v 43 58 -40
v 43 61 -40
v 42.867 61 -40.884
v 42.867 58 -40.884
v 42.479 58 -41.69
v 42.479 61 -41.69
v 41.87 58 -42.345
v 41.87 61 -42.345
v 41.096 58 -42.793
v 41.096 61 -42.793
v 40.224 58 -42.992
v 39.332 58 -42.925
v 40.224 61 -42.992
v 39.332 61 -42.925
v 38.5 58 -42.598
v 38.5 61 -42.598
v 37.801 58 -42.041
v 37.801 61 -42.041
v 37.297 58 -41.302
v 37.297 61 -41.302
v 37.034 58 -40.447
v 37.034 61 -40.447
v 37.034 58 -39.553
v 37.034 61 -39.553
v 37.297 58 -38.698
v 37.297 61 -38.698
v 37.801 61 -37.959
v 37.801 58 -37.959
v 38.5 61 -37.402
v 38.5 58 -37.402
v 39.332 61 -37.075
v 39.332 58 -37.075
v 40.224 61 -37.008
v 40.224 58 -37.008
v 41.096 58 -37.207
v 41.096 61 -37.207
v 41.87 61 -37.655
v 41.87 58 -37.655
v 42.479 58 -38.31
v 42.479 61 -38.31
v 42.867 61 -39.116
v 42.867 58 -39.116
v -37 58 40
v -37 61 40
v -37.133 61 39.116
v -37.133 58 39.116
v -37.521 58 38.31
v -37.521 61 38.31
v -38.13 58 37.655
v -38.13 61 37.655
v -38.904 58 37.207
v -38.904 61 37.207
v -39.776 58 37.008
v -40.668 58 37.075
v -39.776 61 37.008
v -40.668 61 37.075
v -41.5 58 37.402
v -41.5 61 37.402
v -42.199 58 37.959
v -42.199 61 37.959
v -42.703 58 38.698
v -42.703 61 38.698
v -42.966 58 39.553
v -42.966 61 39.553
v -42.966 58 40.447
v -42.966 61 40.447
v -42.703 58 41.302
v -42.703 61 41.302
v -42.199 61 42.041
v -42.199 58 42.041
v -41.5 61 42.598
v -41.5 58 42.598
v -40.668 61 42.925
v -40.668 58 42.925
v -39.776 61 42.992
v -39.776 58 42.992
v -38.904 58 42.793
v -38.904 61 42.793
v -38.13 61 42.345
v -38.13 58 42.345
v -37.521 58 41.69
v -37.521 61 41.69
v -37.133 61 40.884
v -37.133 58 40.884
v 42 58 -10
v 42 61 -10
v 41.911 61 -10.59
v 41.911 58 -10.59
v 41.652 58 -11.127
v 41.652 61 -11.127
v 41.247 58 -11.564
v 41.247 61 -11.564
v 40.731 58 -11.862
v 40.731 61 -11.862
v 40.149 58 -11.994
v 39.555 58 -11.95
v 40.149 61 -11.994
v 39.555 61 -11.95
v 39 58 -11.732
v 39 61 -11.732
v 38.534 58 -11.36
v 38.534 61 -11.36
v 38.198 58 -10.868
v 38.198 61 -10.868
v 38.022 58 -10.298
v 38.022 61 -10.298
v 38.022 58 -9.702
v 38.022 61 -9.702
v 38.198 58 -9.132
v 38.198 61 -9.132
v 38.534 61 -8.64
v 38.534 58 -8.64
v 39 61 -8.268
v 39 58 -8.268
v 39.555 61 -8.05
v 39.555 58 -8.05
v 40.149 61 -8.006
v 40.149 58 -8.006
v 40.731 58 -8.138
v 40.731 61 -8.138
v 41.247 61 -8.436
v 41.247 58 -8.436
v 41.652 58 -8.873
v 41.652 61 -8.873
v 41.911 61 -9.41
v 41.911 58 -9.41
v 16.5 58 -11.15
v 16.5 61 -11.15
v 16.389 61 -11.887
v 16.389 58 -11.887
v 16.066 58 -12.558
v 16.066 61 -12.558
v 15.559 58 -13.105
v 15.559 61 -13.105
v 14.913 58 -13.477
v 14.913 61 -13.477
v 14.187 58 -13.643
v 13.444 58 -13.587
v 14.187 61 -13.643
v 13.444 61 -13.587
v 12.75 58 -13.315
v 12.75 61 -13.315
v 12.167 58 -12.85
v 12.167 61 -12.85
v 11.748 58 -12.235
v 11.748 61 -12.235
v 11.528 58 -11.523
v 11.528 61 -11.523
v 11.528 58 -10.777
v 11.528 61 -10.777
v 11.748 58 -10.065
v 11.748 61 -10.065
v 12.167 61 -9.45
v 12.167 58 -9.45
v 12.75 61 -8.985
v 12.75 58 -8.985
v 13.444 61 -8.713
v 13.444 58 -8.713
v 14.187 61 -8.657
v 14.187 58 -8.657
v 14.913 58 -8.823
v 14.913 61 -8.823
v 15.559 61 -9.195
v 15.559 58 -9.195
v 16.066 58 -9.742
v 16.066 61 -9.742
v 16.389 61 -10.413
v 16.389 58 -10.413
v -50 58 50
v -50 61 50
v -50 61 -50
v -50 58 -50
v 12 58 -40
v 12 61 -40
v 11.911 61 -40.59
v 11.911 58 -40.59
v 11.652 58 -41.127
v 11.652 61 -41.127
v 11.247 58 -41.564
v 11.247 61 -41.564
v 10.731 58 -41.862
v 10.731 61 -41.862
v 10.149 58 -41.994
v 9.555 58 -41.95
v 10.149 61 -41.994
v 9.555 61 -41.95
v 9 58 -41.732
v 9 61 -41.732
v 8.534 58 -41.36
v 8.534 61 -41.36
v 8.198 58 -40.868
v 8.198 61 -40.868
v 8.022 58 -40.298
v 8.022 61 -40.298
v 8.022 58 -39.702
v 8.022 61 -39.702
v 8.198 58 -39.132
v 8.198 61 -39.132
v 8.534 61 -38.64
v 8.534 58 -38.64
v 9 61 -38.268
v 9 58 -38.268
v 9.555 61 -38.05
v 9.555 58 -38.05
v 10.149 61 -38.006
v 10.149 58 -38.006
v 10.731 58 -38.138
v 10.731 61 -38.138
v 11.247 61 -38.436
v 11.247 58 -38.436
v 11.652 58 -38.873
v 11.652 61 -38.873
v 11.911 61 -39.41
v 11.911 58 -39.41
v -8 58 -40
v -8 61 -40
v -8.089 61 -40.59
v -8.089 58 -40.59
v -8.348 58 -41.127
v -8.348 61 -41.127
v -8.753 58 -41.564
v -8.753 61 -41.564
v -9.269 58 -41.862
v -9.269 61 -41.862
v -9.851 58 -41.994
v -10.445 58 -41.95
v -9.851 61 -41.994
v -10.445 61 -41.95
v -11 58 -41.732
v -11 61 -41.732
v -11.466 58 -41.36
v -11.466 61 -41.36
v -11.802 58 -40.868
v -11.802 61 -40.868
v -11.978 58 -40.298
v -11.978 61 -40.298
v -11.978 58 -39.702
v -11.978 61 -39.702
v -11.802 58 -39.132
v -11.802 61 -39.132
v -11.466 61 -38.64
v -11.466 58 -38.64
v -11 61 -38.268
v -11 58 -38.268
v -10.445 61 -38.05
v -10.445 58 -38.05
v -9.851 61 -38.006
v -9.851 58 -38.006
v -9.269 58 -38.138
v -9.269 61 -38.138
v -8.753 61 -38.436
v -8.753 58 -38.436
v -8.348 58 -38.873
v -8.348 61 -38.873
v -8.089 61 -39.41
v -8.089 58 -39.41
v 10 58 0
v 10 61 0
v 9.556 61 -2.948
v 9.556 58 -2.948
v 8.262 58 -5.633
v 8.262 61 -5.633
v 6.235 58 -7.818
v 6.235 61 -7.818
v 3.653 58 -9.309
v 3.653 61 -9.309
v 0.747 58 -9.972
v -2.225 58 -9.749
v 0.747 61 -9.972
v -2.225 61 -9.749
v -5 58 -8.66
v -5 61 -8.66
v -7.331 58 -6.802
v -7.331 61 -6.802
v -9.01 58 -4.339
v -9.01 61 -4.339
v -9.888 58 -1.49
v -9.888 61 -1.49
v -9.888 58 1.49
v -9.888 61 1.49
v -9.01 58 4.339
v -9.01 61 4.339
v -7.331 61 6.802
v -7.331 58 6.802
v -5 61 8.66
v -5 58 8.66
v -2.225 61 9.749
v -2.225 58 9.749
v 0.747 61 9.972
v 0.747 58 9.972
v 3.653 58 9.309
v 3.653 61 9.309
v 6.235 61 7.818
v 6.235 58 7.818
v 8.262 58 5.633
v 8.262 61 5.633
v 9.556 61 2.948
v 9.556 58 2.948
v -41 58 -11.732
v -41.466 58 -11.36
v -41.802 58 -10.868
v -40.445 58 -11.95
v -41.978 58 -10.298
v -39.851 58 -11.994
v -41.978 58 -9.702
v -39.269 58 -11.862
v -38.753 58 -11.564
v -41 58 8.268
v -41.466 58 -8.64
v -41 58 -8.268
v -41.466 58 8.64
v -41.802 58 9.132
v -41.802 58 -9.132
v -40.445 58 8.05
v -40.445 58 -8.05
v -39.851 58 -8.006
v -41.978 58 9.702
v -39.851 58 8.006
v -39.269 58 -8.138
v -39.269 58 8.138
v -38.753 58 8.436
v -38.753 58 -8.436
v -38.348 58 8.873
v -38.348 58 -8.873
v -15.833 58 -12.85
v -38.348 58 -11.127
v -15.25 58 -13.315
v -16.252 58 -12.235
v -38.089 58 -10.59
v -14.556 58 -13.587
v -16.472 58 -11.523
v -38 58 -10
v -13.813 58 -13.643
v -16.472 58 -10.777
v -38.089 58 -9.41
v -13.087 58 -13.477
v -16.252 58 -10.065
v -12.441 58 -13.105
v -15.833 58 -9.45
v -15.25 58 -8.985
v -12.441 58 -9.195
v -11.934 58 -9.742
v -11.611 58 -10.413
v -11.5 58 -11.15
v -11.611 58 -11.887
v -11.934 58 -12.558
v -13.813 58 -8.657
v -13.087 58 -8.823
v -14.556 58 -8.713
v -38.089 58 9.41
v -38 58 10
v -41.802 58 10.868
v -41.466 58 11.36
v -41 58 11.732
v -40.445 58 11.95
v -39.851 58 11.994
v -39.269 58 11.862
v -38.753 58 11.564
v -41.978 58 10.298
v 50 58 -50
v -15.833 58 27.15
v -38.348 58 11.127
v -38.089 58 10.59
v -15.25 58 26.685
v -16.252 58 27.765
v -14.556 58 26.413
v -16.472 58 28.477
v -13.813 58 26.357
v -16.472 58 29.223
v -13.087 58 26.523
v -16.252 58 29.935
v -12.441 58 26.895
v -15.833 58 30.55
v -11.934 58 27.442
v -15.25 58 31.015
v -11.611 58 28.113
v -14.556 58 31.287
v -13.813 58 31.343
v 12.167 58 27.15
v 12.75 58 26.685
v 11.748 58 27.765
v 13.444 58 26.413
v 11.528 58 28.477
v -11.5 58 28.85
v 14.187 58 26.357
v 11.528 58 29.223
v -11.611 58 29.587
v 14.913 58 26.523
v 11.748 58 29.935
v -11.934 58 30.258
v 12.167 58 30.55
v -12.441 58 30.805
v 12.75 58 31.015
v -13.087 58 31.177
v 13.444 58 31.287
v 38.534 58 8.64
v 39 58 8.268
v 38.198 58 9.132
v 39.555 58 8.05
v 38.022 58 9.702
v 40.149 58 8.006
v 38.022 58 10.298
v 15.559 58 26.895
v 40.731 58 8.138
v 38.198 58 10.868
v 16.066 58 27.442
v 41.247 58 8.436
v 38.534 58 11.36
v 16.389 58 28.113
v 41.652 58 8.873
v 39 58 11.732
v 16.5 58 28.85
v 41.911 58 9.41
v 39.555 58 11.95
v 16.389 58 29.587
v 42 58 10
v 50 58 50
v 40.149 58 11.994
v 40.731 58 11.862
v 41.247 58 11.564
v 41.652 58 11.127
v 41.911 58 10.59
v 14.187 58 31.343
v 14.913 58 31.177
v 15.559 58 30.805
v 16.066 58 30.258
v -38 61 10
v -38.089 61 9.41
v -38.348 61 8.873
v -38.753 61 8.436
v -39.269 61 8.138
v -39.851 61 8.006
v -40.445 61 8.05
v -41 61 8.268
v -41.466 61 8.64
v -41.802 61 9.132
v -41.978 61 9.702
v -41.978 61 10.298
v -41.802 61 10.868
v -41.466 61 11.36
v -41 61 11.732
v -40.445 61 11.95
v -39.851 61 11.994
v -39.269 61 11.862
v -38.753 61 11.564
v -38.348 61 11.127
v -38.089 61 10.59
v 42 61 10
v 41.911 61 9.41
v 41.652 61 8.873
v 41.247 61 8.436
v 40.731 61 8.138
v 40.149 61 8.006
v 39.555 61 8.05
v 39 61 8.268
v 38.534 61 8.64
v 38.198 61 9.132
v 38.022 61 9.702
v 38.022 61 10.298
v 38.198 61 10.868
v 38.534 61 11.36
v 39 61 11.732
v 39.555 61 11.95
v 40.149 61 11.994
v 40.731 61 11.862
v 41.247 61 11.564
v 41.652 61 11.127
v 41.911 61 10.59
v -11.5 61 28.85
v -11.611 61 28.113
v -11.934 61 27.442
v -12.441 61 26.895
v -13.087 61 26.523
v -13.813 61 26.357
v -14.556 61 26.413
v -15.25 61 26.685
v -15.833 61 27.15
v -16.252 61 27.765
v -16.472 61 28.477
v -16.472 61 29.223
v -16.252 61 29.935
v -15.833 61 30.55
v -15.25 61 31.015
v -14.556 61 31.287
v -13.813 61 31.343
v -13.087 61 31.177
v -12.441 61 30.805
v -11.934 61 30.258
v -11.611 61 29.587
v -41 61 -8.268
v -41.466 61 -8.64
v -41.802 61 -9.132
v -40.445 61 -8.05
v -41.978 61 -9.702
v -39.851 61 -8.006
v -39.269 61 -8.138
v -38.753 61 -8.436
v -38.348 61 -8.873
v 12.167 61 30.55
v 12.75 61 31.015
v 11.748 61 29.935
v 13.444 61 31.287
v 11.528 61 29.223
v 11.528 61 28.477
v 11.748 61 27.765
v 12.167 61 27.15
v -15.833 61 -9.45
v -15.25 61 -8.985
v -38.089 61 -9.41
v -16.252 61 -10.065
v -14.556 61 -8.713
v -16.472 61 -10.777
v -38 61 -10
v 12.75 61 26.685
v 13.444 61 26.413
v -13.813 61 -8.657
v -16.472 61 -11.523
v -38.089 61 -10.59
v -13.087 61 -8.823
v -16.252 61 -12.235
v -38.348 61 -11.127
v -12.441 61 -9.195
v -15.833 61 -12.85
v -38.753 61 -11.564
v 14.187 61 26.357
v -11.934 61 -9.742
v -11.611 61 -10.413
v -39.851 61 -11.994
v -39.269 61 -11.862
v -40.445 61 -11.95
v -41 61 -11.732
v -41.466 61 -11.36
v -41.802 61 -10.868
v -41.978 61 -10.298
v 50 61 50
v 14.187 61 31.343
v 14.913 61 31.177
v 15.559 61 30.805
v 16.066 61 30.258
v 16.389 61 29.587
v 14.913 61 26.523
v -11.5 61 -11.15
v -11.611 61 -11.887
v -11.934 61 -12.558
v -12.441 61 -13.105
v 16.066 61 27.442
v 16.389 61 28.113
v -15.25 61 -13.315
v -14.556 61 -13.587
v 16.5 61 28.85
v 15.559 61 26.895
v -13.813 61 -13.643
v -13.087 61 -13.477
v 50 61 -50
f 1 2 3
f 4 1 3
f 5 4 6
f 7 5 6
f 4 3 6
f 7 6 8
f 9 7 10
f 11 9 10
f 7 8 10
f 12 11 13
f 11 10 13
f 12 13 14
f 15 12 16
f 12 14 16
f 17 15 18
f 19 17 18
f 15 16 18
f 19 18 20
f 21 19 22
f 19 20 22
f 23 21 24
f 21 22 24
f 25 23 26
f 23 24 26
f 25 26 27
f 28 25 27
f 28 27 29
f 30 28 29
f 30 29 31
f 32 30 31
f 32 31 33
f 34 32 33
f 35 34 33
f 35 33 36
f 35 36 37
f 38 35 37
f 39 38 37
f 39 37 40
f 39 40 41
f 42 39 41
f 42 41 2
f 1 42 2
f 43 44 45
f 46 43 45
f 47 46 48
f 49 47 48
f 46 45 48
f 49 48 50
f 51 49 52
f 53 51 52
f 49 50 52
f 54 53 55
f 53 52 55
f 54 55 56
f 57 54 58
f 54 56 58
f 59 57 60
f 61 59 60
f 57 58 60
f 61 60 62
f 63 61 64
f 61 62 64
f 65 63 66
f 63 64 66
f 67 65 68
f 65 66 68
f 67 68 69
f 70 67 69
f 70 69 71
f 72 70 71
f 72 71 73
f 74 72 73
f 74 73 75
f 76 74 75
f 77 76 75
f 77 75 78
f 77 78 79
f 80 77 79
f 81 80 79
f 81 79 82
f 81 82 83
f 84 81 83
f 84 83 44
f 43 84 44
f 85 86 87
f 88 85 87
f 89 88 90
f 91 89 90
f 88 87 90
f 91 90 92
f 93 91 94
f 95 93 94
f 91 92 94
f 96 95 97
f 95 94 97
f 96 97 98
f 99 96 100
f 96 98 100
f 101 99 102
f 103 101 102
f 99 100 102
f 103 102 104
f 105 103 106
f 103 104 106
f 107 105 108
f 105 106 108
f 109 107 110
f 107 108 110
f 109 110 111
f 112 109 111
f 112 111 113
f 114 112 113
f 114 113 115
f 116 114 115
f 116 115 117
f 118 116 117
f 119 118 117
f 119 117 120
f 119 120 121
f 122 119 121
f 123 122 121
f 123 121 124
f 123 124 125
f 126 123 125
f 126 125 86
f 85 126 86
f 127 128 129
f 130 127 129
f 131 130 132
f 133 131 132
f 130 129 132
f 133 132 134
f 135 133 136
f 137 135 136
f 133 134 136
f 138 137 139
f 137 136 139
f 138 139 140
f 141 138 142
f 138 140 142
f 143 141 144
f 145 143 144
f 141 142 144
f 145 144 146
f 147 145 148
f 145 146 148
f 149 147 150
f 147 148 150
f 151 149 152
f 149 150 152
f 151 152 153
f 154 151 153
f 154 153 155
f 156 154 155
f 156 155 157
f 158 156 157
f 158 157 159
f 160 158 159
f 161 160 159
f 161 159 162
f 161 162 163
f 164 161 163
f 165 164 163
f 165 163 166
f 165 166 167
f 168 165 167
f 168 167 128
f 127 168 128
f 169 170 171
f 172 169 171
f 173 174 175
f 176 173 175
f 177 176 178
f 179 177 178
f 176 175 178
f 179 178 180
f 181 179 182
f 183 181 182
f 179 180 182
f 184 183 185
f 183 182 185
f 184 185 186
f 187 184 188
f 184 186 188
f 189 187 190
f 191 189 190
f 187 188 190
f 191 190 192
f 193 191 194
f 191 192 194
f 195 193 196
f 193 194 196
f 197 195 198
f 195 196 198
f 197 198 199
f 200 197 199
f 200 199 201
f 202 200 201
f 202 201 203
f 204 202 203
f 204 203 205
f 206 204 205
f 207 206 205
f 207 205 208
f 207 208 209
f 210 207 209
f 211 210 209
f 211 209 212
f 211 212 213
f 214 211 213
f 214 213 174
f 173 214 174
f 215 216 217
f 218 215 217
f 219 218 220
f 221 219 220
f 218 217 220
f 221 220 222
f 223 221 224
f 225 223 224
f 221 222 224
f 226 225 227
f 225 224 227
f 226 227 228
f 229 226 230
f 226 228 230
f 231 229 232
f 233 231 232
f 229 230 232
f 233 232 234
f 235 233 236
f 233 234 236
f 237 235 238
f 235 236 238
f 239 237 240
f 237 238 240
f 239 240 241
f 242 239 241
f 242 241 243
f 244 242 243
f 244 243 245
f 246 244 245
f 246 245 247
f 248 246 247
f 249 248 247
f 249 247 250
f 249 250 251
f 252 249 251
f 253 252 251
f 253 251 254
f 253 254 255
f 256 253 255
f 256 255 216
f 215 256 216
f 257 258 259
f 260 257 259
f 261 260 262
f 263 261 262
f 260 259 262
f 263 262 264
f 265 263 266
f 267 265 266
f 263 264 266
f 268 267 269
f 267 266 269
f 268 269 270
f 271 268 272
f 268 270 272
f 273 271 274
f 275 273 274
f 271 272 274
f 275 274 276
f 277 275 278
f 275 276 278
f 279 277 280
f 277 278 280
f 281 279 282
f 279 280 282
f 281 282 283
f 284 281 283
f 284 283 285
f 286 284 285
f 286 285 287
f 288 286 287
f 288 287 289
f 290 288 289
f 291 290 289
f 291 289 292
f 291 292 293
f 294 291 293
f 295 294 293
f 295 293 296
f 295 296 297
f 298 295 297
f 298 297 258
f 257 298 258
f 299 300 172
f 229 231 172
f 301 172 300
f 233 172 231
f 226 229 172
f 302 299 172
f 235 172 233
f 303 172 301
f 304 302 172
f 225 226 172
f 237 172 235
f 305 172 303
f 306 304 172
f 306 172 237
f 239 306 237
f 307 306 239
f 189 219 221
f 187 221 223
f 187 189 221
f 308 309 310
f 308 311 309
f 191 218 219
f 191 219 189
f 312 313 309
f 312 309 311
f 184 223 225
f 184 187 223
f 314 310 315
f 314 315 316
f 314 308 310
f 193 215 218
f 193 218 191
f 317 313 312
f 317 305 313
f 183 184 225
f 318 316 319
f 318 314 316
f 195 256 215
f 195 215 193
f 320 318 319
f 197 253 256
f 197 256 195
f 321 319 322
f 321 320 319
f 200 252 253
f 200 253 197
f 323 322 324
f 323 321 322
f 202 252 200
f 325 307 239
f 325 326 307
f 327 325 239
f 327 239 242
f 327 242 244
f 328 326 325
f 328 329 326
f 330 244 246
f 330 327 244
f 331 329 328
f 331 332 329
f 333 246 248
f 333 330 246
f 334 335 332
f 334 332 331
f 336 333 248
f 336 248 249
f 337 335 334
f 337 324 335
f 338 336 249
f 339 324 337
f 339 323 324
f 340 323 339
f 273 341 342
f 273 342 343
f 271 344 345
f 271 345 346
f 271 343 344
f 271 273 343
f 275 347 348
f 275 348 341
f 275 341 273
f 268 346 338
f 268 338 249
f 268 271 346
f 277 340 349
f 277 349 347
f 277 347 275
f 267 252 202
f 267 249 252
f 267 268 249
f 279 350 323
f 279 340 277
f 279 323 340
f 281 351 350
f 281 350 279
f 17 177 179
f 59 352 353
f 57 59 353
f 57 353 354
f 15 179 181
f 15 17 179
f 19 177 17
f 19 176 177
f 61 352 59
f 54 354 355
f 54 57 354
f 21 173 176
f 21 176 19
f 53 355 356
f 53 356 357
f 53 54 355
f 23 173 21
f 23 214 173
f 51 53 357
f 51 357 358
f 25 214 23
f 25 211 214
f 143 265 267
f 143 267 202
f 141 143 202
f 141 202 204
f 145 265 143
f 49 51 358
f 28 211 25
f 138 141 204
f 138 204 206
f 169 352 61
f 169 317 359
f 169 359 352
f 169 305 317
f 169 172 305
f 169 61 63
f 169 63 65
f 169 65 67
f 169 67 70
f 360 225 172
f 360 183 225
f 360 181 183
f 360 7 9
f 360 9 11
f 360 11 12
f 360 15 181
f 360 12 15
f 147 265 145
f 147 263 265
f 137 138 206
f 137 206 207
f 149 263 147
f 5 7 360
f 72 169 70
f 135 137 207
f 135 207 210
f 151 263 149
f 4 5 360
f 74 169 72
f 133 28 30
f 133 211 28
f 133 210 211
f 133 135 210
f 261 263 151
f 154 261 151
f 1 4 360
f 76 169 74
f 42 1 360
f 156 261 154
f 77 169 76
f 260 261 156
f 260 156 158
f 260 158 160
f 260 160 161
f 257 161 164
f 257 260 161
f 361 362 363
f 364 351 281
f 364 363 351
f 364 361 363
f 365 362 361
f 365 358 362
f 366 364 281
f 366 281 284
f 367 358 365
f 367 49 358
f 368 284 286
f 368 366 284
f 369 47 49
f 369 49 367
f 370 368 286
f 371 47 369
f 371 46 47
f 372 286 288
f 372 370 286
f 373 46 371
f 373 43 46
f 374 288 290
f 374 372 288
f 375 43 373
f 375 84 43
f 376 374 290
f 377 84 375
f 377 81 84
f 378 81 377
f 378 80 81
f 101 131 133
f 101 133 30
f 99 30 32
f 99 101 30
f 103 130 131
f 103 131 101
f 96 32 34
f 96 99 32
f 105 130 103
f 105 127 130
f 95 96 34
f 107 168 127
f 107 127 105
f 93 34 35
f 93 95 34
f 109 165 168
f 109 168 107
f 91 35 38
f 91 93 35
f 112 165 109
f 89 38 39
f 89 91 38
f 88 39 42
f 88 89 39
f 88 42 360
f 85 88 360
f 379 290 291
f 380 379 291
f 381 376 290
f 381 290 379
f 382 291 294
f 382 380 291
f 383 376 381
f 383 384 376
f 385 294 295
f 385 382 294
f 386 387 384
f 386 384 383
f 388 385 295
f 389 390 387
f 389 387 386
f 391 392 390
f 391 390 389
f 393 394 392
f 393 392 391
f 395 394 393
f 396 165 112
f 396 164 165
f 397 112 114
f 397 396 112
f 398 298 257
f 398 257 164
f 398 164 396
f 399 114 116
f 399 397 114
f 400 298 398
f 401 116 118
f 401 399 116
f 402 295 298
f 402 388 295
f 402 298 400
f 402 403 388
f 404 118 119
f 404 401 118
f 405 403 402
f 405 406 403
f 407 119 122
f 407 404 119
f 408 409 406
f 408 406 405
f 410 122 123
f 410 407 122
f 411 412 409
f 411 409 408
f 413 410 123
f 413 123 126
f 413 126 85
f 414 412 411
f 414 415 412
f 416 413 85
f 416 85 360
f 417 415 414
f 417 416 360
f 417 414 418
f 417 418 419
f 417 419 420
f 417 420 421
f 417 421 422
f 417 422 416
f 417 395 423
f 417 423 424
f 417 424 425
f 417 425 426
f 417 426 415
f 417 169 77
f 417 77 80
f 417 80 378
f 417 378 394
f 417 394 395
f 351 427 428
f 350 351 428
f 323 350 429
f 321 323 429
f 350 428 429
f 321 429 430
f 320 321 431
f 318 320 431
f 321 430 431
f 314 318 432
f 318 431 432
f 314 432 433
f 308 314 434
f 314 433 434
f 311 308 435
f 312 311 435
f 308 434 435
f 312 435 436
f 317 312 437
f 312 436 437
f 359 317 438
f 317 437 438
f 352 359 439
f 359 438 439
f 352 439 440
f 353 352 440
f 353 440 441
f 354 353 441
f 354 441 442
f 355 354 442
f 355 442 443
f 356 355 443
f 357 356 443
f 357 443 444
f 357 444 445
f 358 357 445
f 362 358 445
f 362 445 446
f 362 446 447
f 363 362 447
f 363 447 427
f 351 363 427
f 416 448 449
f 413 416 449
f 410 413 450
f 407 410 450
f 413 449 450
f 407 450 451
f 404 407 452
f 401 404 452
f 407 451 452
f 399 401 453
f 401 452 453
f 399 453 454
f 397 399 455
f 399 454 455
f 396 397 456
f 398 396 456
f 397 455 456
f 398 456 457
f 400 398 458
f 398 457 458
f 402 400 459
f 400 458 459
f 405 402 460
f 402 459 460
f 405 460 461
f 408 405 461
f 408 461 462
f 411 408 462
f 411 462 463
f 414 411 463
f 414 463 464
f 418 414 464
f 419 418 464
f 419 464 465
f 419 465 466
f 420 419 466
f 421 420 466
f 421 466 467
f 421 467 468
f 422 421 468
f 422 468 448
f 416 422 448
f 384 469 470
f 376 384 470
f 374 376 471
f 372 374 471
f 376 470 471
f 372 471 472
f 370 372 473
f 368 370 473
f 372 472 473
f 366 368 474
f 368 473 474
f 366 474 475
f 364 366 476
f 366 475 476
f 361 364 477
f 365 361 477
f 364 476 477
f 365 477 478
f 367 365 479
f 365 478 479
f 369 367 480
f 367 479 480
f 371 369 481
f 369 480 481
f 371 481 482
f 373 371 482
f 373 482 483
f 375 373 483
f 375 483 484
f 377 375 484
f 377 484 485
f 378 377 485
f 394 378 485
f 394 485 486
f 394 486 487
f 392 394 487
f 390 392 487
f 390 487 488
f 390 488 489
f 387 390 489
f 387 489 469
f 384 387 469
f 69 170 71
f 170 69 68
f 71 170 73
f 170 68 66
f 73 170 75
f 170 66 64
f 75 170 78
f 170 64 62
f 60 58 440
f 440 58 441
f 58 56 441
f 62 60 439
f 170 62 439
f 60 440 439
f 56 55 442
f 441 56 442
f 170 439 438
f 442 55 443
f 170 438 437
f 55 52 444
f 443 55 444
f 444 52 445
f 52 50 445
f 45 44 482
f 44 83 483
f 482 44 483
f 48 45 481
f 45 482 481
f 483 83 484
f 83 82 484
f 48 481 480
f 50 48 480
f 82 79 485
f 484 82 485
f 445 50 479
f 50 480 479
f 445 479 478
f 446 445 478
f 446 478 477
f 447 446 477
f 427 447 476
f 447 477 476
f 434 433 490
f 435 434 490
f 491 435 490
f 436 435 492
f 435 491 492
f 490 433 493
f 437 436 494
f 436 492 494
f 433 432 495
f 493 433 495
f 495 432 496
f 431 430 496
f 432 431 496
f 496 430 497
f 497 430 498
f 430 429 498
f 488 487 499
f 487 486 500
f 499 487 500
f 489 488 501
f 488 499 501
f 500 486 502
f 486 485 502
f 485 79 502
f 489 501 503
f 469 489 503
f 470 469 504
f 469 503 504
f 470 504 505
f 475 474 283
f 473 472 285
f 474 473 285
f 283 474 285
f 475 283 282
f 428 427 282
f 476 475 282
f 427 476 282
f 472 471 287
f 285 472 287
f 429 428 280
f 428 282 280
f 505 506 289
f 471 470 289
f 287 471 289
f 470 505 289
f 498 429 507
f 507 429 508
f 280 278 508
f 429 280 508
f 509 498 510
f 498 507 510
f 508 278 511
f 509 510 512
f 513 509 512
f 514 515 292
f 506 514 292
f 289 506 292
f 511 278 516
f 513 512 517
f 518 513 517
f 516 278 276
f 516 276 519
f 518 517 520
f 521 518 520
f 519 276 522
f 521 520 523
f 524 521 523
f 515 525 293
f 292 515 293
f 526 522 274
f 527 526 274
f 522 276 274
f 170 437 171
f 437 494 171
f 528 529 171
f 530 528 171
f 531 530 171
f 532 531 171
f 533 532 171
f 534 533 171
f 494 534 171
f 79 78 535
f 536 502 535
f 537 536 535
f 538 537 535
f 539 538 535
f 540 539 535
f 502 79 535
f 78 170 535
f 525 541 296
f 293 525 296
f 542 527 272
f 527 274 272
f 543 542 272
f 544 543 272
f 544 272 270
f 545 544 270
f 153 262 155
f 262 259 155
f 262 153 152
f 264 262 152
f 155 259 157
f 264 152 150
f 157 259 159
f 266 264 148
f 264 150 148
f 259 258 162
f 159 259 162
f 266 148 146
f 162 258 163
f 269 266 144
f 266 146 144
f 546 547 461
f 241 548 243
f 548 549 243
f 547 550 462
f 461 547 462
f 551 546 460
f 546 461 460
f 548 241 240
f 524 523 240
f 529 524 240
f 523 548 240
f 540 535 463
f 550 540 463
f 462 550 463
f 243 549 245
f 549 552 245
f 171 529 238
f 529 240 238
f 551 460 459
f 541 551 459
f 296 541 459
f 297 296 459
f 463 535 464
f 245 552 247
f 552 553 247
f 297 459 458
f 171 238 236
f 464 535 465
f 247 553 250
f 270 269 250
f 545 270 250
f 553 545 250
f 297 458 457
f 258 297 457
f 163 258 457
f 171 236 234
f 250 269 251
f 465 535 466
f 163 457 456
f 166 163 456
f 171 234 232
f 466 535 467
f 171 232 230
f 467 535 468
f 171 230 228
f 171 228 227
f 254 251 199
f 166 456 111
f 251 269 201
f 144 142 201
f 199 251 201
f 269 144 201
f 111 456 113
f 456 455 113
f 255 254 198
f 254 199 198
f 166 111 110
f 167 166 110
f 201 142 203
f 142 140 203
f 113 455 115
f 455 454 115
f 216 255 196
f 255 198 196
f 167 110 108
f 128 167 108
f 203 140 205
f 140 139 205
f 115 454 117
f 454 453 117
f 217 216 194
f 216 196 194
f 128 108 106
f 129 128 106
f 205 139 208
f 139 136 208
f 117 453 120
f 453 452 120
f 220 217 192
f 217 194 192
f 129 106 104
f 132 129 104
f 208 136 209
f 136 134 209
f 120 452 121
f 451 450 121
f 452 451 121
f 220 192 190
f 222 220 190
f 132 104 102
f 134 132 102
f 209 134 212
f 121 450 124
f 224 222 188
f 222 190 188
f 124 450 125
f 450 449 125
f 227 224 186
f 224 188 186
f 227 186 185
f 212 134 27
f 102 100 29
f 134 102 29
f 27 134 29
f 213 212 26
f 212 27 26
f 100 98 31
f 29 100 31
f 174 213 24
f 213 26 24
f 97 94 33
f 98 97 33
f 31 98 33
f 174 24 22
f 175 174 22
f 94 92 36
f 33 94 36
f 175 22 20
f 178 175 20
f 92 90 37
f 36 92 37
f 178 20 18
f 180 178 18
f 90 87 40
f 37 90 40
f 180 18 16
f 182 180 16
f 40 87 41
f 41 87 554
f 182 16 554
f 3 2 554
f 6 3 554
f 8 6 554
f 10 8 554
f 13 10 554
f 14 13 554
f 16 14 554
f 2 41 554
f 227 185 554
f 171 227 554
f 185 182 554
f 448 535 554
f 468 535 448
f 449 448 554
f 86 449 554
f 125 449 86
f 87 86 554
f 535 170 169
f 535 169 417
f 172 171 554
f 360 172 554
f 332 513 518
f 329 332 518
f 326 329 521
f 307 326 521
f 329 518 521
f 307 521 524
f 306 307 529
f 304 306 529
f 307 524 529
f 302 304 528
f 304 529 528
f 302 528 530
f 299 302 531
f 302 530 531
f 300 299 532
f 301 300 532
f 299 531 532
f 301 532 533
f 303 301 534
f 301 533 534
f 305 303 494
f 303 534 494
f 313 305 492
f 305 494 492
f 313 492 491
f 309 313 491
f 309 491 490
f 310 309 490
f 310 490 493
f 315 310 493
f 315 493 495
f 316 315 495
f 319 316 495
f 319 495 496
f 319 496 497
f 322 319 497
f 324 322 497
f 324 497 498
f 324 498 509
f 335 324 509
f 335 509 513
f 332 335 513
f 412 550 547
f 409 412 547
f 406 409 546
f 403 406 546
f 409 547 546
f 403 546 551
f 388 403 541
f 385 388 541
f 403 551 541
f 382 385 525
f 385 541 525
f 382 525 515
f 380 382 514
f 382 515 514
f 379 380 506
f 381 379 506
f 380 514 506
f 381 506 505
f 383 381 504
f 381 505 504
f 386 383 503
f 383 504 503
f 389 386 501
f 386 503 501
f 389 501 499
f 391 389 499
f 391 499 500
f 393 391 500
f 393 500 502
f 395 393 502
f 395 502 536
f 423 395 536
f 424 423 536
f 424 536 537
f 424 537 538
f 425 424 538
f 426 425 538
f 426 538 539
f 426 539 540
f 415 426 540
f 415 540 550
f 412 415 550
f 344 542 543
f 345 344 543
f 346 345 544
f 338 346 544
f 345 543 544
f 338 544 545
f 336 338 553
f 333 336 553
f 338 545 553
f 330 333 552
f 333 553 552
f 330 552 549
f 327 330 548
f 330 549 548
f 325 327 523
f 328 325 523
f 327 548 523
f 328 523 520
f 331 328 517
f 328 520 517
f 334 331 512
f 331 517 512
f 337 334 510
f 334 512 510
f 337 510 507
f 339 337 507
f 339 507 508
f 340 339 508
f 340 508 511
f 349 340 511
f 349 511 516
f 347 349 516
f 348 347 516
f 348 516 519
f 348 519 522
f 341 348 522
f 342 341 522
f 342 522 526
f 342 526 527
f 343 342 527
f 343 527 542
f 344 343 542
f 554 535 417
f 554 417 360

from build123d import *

# Parameters (mm, degrees)
SKETCH2_W               = 110
SKETCH2_H               = 110
SKETCH2_W_2             = 100
SKETCH2_H_2             = 100
BOSS_EXTRUDE1_DEPTH     = 89
SKETCH3_W               = 110
SKETCH3_H               = 110
BOSS_EXTRUDE2_DEPTH     = 8
CUT_EXTRUDE1_REACH      = 112
SKETCH6_W               = 60
SKETCH6_H               = 58
SKETCH9_W               = 110
SKETCH9_H               = 110
BOSS_EXTRUDE3_DEPTH     = 3
CUT_EXTRUDE2_REACH      = 63
SKETCH10_R              = 10
BOSS_EXTRUDE4_DEPTH     = 1.5
BOSS_EXTRUDE5_DEPTH     = 1.5
SKETCH14_R              = 3
CUT_EXTRUDE3_DEPTH      = 73
SKETCH15_W              = 2
SKETCH15_H              = 2
CUT_EXTRUDE4_DEPTH      = 113
CUT_EXTRUDE4_DEPTH_BACK = 13
CUT_EXTRUDE5_REACH      = 63
SKETCH16_R              = 2.5
SKETCH17_R              = 14
SKETCH17_R_2            = 11
BOSS_EXTRUDE6_DEPTH     = 7
CUT_EXTRUDE8_REACH      = 7
SKETCH20_R              = 2
SKETCH18_R              = 2
CUT_EXTRUDE6_DEPTH      = 73.5
CUT_EXTRUDE7_REACH      = 63
SKETCH19_R              = 2
SKETCH21_R              = 24
SKETCH21_R_2            = 21
BOSS_EXTRUDE7_DEPTH     = 5
SKETCH23_W              = 110
SKETCH23_H              = 110
CUT_EXTRUDE9_DEPTH      = 58
SKETCH24_W              = 110
SKETCH24_H              = 110
CUT_EXTRUDE10_DEPTH     = 34
CUT_EXTRUDE11_REACH     = 12
SKETCH25_W              = 110
SKETCH25_H              = 110
SKETCH25_W_2            = 100
SKETCH25_H_2            = 100
SKETCH26_R              = 14
CUT_EXTRUDE13_DEPTH     = 7


with BuildPart() as part:
    # Sketch2 → Boss-Extrude1 (new body)
    with BuildSketch(Plane(origin=(0, 0, 0), x_dir=(1, 0, 0), z_dir=(0, 1, 0))):
        Rectangle(SKETCH2_W, SKETCH2_H)
        Rectangle(SKETCH2_W_2, SKETCH2_H_2, mode=Mode.SUBTRACT)
    extrude(amount=BOSS_EXTRUDE1_DEPTH)

    # Sketch3 → Boss-Extrude2 (add)
    with BuildSketch(Plane(origin=(0, 89, 0), x_dir=(1, 0, 0), z_dir=(0, 1, 0))):
        Rectangle(SKETCH3_W, SKETCH3_H)
    extrude(amount=BOSS_EXTRUDE2_DEPTH)

    # Sketch6 → Cut-Extrude1 (cut, up to next)
    with BuildSketch(Plane.XY.offset(55), mode=Mode.PRIVATE) as cut_extrude1_sk1:
        with Locations((0, 29)):
            Rectangle(SKETCH6_W, SKETCH6_H)
    cut_extrude1_tool1 = extrude(cut_extrude1_sk1.sketch, amount=-CUT_EXTRUDE1_REACH, mode=Mode.PRIVATE) & part.part
    add(cut_extrude1_tool1.solids().sort_by_distance((0, 29, 55))[0], mode=Mode.SUBTRACT)

    # Sketch8 → Cut-Revolve1 (revolve, cut)
    with BuildSketch(Plane.XY):
        Polygon((0, 97), (-21, 97), (-21, 94.5), (-16.2, 94.5), (-16.2, 88.5), (0, 88.5), align=None)
    revolve(axis=Axis((0, 0, 0), (0, 1, 0)), mode=Mode.SUBTRACT)

    # Sketch9 → Boss-Extrude3 (add)
    with BuildSketch(Plane.XZ.offset(-58)):
        Rectangle(SKETCH9_W, SKETCH9_H)
    extrude(amount=-BOSS_EXTRUDE3_DEPTH)

    # Sketch10 → Cut-Extrude2 (cut, up to next)
    with BuildSketch(Plane(origin=(0, 61, 0), x_dir=(1, 0, 0), z_dir=(0, 1, 0)), mode=Mode.PRIVATE) as cut_extrude2_sk1:
        Circle(SKETCH10_R)
    cut_extrude2_tool1 = extrude(cut_extrude2_sk1.sketch, amount=-CUT_EXTRUDE2_REACH, mode=Mode.PRIVATE) & part.part
    add(cut_extrude2_tool1.solids().sort_by_distance((0, 61, 0))[0], mode=Mode.SUBTRACT)

    # Sketch11 → Boss-Extrude4 (add, symmetric)
    with BuildSketch(Plane.XY):
        Polygon((-50, 89), (-35, 89), (-50, 69), align=None)
    boss_extrude4 = extrude(amount=BOSS_EXTRUDE4_DEPTH, both=True)

    # Mirror1: Boss-Extrude4 across plane
    add(boss_extrude4.mirror(Plane(origin=(0, 0, 0), x_dir=(0, 0, 1), z_dir=(1, 0, 0))))

    # Sketch12 → Boss-Extrude5 (add, symmetric)
    with BuildSketch(Plane(origin=(0, 0, 0), x_dir=(0, 0, -1), z_dir=(1, 0, 0))):
        Polygon((-35, 89), (-50, 89), (-50, 69), align=None)
    boss_extrude5 = extrude(amount=BOSS_EXTRUDE5_DEPTH, both=True)

    # Mirror2: Boss-Extrude5 across plane
    add(boss_extrude5.mirror(Plane.XY))

    # Sketch14 → Cut-Extrude3 (cut)
    with BuildSketch(Plane(origin=(0, 97, 0), x_dir=(1, 0, 0), z_dir=(0, 1, 0))):
        with Locations((40, 40)):
            Circle(SKETCH14_R)
        with Locations((-40, -40)):
            Circle(SKETCH14_R)
    extrude(amount=-CUT_EXTRUDE3_DEPTH, mode=Mode.SUBTRACT)

    # Sketch15 → Cut-Extrude4 (cut, two sides)
    with BuildSketch(Plane(origin=(-50, 0, 0), x_dir=(0, 0, -1), z_dir=(1, 0, 0))) as cut_extrude4_sk:
        with Locations((-24, 62)):
            Rectangle(SKETCH15_W, SKETCH15_H)
        with Locations((24, 62)):
            Rectangle(SKETCH15_W, SKETCH15_H)
    extrude(amount=CUT_EXTRUDE4_DEPTH, mode=Mode.SUBTRACT)
    extrude(cut_extrude4_sk.sketch, amount=-CUT_EXTRUDE4_DEPTH_BACK, mode=Mode.SUBTRACT)

    # Sketch16 → Cut-Extrude5 (cut, up to next)
    with BuildSketch(Plane(origin=(0, 61, 0), x_dir=(1, 0, 0), z_dir=(0, 1, 0)), mode=Mode.PRIVATE) as cut_extrude5_sk1:
        with Locations((-14, 11.15)):
            Circle(SKETCH16_R)
    cut_extrude5_tool1 = extrude(cut_extrude5_sk1.sketch, amount=-CUT_EXTRUDE5_REACH, mode=Mode.PRIVATE) & part.part
    add(cut_extrude5_tool1.solids().sort_by_distance((-14, 61, -11.15))[0], mode=Mode.SUBTRACT)
    # Sketch16 → Cut-Extrude5 (cut, up to next)
    with BuildSketch(Plane(origin=(0, 61, 0), x_dir=(1, 0, 0), z_dir=(0, 1, 0)), mode=Mode.PRIVATE) as cut_extrude5_sk2:
        with Locations((-14, -28.85)):
            Circle(SKETCH16_R)
    cut_extrude5_tool2 = extrude(cut_extrude5_sk2.sketch, amount=-CUT_EXTRUDE5_REACH, mode=Mode.PRIVATE) & part.part
    add(cut_extrude5_tool2.solids().sort_by_distance((-14, 61, 28.85))[0], mode=Mode.SUBTRACT)
    # Sketch16 → Cut-Extrude5 (cut, up to next)
    with BuildSketch(Plane(origin=(0, 61, 0), x_dir=(1, 0, 0), z_dir=(0, 1, 0)), mode=Mode.PRIVATE) as cut_extrude5_sk3:
        with Locations((14, -28.85)):
            Circle(SKETCH16_R)
    cut_extrude5_tool3 = extrude(cut_extrude5_sk3.sketch, amount=-CUT_EXTRUDE5_REACH, mode=Mode.PRIVATE) & part.part
    add(cut_extrude5_tool3.solids().sort_by_distance((14, 61, 28.85))[0], mode=Mode.SUBTRACT)
    # Sketch16 → Cut-Extrude5 (cut, up to next)
    with BuildSketch(Plane(origin=(0, 61, 0), x_dir=(1, 0, 0), z_dir=(0, 1, 0)), mode=Mode.PRIVATE) as cut_extrude5_sk4:
        with Locations((14, 11.15)):
            Circle(SKETCH16_R)
    cut_extrude5_tool4 = extrude(cut_extrude5_sk4.sketch, amount=-CUT_EXTRUDE5_REACH, mode=Mode.PRIVATE) & part.part
    add(cut_extrude5_tool4.solids().sort_by_distance((14, 61, -11.15))[0], mode=Mode.SUBTRACT)

    # Sketch17 → Boss-Extrude6 (add)
    with BuildSketch(Plane(origin=(0, 61, 0), x_dir=(1, 0, 0), z_dir=(0, 1, 0))):
        Circle(SKETCH17_R)
        Circle(SKETCH17_R_2, mode=Mode.SUBTRACT)
    extrude(amount=BOSS_EXTRUDE6_DEPTH)

    # Sketch20 → Cut-Extrude8 (cut, up to next)
    with BuildSketch(Plane.XY.offset(-50), mode=Mode.PRIVATE) as cut_extrude8_sk1:
        with Locations((10, 48)):
            Circle(SKETCH20_R)
    cut_extrude8_tool1 = extrude(cut_extrude8_sk1.sketch, amount=-CUT_EXTRUDE8_REACH, mode=Mode.PRIVATE) & part.part
    add(cut_extrude8_tool1.solids().sort_by_distance((10, 48, -50))[0], mode=Mode.SUBTRACT)
    # Sketch20 → Cut-Extrude8 (cut, up to next)
    with BuildSketch(Plane.XY.offset(-50), mode=Mode.PRIVATE) as cut_extrude8_sk2:
        with Locations((-10, 48)):
            Circle(SKETCH20_R)
    cut_extrude8_tool2 = extrude(cut_extrude8_sk2.sketch, amount=-CUT_EXTRUDE8_REACH, mode=Mode.PRIVATE) & part.part
    add(cut_extrude8_tool2.solids().sort_by_distance((-10, 48, -50))[0], mode=Mode.SUBTRACT)

    # Sketch18 → Cut-Extrude6 (cut, symmetric)
    with BuildSketch(Plane(origin=(0, 0, 0), x_dir=(0, 0, -1), z_dir=(1, 0, 0))):
        with Locations((10, 48)):
            Circle(SKETCH18_R)
        with Locations((-10, 48)):
            Circle(SKETCH18_R)
    extrude(amount=CUT_EXTRUDE6_DEPTH, both=True, mode=Mode.SUBTRACT)

    # Sketch19 → Cut-Extrude7 (cut, up to next)
    with BuildSketch(Plane(origin=(0, 61, 0), x_dir=(1, 0, 0), z_dir=(0, 1, 0)), mode=Mode.PRIVATE) as cut_extrude7_sk1:
        with Locations((40, 10)):
            Circle(SKETCH19_R)
    cut_extrude7_tool1 = extrude(cut_extrude7_sk1.sketch, amount=-CUT_EXTRUDE7_REACH, mode=Mode.PRIVATE) & part.part
    add(cut_extrude7_tool1.solids().sort_by_distance((40, 61, -10))[0], mode=Mode.SUBTRACT)
    # Sketch19 → Cut-Extrude7 (cut, up to next)
    with BuildSketch(Plane(origin=(0, 61, 0), x_dir=(1, 0, 0), z_dir=(0, 1, 0)), mode=Mode.PRIVATE) as cut_extrude7_sk2:
        with Locations((40, -10)):
            Circle(SKETCH19_R)
    cut_extrude7_tool2 = extrude(cut_extrude7_sk2.sketch, amount=-CUT_EXTRUDE7_REACH, mode=Mode.PRIVATE) & part.part
    add(cut_extrude7_tool2.solids().sort_by_distance((40, 61, 10))[0], mode=Mode.SUBTRACT)
    # Sketch19 → Cut-Extrude7 (cut, up to next)
    with BuildSketch(Plane(origin=(0, 61, 0), x_dir=(1, 0, 0), z_dir=(0, 1, 0)), mode=Mode.PRIVATE) as cut_extrude7_sk3:
        with Locations((-40, -10)):
            Circle(SKETCH19_R)
    cut_extrude7_tool3 = extrude(cut_extrude7_sk3.sketch, amount=-CUT_EXTRUDE7_REACH, mode=Mode.PRIVATE) & part.part
    add(cut_extrude7_tool3.solids().sort_by_distance((-40, 61, 10))[0], mode=Mode.SUBTRACT)
    # Sketch19 → Cut-Extrude7 (cut, up to next)
    with BuildSketch(Plane(origin=(0, 61, 0), x_dir=(1, 0, 0), z_dir=(0, 1, 0)), mode=Mode.PRIVATE) as cut_extrude7_sk4:
        with Locations((-40, 10)):
            Circle(SKETCH19_R)
    cut_extrude7_tool4 = extrude(cut_extrude7_sk4.sketch, amount=-CUT_EXTRUDE7_REACH, mode=Mode.PRIVATE) & part.part
    add(cut_extrude7_tool4.solids().sort_by_distance((-40, 61, -10))[0], mode=Mode.SUBTRACT)
    # Sketch19 → Cut-Extrude7 (cut, up to next)
    with BuildSketch(Plane(origin=(0, 61, 0), x_dir=(1, 0, 0), z_dir=(0, 1, 0)), mode=Mode.PRIVATE) as cut_extrude7_sk5:
        with Locations((10, 40)):
            Circle(SKETCH19_R)
    cut_extrude7_tool5 = extrude(cut_extrude7_sk5.sketch, amount=-CUT_EXTRUDE7_REACH, mode=Mode.PRIVATE) & part.part
    add(cut_extrude7_tool5.solids().sort_by_distance((10, 61, -40))[0], mode=Mode.SUBTRACT)
    # Sketch19 → Cut-Extrude7 (cut, up to next)
    with BuildSketch(Plane(origin=(0, 61, 0), x_dir=(1, 0, 0), z_dir=(0, 1, 0)), mode=Mode.PRIVATE) as cut_extrude7_sk6:
        with Locations((-10, 40)):
            Circle(SKETCH19_R)
    cut_extrude7_tool6 = extrude(cut_extrude7_sk6.sketch, amount=-CUT_EXTRUDE7_REACH, mode=Mode.PRIVATE) & part.part
    add(cut_extrude7_tool6.solids().sort_by_distance((-10, 61, -40))[0], mode=Mode.SUBTRACT)

    # Sketch21 → Boss-Extrude7 (add)
    with BuildSketch(Plane(origin=(0, 97, 0), x_dir=(1, 0, 0), z_dir=(0, 1, 0))):
        Circle(SKETCH21_R)
        Circle(SKETCH21_R_2, mode=Mode.SUBTRACT)
    extrude(amount=BOSS_EXTRUDE7_DEPTH)

    # Sketch23 → Cut-Extrude9 (cut)
    with BuildSketch(Plane.XZ):
        Rectangle(SKETCH23_W, SKETCH23_H)
    extrude(amount=-CUT_EXTRUDE9_DEPTH, mode=Mode.SUBTRACT)

    # Sketch24 → Cut-Extrude10 (cut)
    with BuildSketch(Plane(origin=(0, 102, 0), x_dir=(1, 0, 0), z_dir=(0, 1, 0))):
        Rectangle(SKETCH24_W, SKETCH24_H)
    extrude(amount=-CUT_EXTRUDE10_DEPTH, mode=Mode.SUBTRACT)

    # Sketch25 → Cut-Extrude11 (cut, up to next)
    with BuildSketch(Plane(origin=(0, 68, 0), x_dir=(1, 0, 0), z_dir=(0, 1, 0)), mode=Mode.PRIVATE) as cut_extrude11_sk1:
        Rectangle(SKETCH25_W, SKETCH25_H)
        Rectangle(SKETCH25_W_2, SKETCH25_H_2, mode=Mode.SUBTRACT)
    cut_extrude11_tool1 = extrude(cut_extrude11_sk1.sketch, amount=-CUT_EXTRUDE11_REACH, mode=Mode.PRIVATE) & part.part
    add(cut_extrude11_tool1.solids().sort_by_distance((0, 68, 53.444365))[0], mode=Mode.SUBTRACT)

    # Sketch26 → Cut-Extrude13 (cut)
    with BuildSketch(Plane(origin=(0, 68, 0), x_dir=(1, 0, 0), z_dir=(0, 1, 0))):
        Circle(SKETCH26_R)
    extrude(amount=-CUT_EXTRUDE13_DEPTH, mode=Mode.SUBTRACT)


solid = part.part
